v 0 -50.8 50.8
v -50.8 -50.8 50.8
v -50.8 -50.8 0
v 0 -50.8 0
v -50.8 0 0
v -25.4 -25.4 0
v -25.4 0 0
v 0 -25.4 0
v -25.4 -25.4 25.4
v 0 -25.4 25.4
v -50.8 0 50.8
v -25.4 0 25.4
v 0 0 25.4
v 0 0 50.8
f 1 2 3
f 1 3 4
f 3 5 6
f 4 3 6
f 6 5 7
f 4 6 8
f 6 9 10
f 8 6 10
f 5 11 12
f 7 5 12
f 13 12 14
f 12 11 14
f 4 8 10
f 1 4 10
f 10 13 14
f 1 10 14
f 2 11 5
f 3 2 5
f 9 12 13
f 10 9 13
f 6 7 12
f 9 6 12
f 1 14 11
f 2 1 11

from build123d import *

# Parameters (mm, degrees)
F2_DEPTH = 50.8
F1_W     = 25.4
F1_H     = 25.4
F3_DEPTH = 25.4


with BuildPart() as f2:
    # F0 (on Front) → F2 (new body)
    with BuildSketch(Plane.XZ):
        Polygon((-25.4, 0), (0, 0), (0, 25.4), (0, 50.8), (-50.8, 50.8), (-50.8, 0), align=None)
    extrude(amount=F2_DEPTH)

    # F1 (on face) → F3 (cut)
    with BuildSketch(Plane.XZ):
        with Locations((-12.7, 12.7)):
            Rectangle(F1_W, F1_H)
    extrude(amount=F3_DEPTH, mode=Mode.SUBTRACT)


solid = f2.part
